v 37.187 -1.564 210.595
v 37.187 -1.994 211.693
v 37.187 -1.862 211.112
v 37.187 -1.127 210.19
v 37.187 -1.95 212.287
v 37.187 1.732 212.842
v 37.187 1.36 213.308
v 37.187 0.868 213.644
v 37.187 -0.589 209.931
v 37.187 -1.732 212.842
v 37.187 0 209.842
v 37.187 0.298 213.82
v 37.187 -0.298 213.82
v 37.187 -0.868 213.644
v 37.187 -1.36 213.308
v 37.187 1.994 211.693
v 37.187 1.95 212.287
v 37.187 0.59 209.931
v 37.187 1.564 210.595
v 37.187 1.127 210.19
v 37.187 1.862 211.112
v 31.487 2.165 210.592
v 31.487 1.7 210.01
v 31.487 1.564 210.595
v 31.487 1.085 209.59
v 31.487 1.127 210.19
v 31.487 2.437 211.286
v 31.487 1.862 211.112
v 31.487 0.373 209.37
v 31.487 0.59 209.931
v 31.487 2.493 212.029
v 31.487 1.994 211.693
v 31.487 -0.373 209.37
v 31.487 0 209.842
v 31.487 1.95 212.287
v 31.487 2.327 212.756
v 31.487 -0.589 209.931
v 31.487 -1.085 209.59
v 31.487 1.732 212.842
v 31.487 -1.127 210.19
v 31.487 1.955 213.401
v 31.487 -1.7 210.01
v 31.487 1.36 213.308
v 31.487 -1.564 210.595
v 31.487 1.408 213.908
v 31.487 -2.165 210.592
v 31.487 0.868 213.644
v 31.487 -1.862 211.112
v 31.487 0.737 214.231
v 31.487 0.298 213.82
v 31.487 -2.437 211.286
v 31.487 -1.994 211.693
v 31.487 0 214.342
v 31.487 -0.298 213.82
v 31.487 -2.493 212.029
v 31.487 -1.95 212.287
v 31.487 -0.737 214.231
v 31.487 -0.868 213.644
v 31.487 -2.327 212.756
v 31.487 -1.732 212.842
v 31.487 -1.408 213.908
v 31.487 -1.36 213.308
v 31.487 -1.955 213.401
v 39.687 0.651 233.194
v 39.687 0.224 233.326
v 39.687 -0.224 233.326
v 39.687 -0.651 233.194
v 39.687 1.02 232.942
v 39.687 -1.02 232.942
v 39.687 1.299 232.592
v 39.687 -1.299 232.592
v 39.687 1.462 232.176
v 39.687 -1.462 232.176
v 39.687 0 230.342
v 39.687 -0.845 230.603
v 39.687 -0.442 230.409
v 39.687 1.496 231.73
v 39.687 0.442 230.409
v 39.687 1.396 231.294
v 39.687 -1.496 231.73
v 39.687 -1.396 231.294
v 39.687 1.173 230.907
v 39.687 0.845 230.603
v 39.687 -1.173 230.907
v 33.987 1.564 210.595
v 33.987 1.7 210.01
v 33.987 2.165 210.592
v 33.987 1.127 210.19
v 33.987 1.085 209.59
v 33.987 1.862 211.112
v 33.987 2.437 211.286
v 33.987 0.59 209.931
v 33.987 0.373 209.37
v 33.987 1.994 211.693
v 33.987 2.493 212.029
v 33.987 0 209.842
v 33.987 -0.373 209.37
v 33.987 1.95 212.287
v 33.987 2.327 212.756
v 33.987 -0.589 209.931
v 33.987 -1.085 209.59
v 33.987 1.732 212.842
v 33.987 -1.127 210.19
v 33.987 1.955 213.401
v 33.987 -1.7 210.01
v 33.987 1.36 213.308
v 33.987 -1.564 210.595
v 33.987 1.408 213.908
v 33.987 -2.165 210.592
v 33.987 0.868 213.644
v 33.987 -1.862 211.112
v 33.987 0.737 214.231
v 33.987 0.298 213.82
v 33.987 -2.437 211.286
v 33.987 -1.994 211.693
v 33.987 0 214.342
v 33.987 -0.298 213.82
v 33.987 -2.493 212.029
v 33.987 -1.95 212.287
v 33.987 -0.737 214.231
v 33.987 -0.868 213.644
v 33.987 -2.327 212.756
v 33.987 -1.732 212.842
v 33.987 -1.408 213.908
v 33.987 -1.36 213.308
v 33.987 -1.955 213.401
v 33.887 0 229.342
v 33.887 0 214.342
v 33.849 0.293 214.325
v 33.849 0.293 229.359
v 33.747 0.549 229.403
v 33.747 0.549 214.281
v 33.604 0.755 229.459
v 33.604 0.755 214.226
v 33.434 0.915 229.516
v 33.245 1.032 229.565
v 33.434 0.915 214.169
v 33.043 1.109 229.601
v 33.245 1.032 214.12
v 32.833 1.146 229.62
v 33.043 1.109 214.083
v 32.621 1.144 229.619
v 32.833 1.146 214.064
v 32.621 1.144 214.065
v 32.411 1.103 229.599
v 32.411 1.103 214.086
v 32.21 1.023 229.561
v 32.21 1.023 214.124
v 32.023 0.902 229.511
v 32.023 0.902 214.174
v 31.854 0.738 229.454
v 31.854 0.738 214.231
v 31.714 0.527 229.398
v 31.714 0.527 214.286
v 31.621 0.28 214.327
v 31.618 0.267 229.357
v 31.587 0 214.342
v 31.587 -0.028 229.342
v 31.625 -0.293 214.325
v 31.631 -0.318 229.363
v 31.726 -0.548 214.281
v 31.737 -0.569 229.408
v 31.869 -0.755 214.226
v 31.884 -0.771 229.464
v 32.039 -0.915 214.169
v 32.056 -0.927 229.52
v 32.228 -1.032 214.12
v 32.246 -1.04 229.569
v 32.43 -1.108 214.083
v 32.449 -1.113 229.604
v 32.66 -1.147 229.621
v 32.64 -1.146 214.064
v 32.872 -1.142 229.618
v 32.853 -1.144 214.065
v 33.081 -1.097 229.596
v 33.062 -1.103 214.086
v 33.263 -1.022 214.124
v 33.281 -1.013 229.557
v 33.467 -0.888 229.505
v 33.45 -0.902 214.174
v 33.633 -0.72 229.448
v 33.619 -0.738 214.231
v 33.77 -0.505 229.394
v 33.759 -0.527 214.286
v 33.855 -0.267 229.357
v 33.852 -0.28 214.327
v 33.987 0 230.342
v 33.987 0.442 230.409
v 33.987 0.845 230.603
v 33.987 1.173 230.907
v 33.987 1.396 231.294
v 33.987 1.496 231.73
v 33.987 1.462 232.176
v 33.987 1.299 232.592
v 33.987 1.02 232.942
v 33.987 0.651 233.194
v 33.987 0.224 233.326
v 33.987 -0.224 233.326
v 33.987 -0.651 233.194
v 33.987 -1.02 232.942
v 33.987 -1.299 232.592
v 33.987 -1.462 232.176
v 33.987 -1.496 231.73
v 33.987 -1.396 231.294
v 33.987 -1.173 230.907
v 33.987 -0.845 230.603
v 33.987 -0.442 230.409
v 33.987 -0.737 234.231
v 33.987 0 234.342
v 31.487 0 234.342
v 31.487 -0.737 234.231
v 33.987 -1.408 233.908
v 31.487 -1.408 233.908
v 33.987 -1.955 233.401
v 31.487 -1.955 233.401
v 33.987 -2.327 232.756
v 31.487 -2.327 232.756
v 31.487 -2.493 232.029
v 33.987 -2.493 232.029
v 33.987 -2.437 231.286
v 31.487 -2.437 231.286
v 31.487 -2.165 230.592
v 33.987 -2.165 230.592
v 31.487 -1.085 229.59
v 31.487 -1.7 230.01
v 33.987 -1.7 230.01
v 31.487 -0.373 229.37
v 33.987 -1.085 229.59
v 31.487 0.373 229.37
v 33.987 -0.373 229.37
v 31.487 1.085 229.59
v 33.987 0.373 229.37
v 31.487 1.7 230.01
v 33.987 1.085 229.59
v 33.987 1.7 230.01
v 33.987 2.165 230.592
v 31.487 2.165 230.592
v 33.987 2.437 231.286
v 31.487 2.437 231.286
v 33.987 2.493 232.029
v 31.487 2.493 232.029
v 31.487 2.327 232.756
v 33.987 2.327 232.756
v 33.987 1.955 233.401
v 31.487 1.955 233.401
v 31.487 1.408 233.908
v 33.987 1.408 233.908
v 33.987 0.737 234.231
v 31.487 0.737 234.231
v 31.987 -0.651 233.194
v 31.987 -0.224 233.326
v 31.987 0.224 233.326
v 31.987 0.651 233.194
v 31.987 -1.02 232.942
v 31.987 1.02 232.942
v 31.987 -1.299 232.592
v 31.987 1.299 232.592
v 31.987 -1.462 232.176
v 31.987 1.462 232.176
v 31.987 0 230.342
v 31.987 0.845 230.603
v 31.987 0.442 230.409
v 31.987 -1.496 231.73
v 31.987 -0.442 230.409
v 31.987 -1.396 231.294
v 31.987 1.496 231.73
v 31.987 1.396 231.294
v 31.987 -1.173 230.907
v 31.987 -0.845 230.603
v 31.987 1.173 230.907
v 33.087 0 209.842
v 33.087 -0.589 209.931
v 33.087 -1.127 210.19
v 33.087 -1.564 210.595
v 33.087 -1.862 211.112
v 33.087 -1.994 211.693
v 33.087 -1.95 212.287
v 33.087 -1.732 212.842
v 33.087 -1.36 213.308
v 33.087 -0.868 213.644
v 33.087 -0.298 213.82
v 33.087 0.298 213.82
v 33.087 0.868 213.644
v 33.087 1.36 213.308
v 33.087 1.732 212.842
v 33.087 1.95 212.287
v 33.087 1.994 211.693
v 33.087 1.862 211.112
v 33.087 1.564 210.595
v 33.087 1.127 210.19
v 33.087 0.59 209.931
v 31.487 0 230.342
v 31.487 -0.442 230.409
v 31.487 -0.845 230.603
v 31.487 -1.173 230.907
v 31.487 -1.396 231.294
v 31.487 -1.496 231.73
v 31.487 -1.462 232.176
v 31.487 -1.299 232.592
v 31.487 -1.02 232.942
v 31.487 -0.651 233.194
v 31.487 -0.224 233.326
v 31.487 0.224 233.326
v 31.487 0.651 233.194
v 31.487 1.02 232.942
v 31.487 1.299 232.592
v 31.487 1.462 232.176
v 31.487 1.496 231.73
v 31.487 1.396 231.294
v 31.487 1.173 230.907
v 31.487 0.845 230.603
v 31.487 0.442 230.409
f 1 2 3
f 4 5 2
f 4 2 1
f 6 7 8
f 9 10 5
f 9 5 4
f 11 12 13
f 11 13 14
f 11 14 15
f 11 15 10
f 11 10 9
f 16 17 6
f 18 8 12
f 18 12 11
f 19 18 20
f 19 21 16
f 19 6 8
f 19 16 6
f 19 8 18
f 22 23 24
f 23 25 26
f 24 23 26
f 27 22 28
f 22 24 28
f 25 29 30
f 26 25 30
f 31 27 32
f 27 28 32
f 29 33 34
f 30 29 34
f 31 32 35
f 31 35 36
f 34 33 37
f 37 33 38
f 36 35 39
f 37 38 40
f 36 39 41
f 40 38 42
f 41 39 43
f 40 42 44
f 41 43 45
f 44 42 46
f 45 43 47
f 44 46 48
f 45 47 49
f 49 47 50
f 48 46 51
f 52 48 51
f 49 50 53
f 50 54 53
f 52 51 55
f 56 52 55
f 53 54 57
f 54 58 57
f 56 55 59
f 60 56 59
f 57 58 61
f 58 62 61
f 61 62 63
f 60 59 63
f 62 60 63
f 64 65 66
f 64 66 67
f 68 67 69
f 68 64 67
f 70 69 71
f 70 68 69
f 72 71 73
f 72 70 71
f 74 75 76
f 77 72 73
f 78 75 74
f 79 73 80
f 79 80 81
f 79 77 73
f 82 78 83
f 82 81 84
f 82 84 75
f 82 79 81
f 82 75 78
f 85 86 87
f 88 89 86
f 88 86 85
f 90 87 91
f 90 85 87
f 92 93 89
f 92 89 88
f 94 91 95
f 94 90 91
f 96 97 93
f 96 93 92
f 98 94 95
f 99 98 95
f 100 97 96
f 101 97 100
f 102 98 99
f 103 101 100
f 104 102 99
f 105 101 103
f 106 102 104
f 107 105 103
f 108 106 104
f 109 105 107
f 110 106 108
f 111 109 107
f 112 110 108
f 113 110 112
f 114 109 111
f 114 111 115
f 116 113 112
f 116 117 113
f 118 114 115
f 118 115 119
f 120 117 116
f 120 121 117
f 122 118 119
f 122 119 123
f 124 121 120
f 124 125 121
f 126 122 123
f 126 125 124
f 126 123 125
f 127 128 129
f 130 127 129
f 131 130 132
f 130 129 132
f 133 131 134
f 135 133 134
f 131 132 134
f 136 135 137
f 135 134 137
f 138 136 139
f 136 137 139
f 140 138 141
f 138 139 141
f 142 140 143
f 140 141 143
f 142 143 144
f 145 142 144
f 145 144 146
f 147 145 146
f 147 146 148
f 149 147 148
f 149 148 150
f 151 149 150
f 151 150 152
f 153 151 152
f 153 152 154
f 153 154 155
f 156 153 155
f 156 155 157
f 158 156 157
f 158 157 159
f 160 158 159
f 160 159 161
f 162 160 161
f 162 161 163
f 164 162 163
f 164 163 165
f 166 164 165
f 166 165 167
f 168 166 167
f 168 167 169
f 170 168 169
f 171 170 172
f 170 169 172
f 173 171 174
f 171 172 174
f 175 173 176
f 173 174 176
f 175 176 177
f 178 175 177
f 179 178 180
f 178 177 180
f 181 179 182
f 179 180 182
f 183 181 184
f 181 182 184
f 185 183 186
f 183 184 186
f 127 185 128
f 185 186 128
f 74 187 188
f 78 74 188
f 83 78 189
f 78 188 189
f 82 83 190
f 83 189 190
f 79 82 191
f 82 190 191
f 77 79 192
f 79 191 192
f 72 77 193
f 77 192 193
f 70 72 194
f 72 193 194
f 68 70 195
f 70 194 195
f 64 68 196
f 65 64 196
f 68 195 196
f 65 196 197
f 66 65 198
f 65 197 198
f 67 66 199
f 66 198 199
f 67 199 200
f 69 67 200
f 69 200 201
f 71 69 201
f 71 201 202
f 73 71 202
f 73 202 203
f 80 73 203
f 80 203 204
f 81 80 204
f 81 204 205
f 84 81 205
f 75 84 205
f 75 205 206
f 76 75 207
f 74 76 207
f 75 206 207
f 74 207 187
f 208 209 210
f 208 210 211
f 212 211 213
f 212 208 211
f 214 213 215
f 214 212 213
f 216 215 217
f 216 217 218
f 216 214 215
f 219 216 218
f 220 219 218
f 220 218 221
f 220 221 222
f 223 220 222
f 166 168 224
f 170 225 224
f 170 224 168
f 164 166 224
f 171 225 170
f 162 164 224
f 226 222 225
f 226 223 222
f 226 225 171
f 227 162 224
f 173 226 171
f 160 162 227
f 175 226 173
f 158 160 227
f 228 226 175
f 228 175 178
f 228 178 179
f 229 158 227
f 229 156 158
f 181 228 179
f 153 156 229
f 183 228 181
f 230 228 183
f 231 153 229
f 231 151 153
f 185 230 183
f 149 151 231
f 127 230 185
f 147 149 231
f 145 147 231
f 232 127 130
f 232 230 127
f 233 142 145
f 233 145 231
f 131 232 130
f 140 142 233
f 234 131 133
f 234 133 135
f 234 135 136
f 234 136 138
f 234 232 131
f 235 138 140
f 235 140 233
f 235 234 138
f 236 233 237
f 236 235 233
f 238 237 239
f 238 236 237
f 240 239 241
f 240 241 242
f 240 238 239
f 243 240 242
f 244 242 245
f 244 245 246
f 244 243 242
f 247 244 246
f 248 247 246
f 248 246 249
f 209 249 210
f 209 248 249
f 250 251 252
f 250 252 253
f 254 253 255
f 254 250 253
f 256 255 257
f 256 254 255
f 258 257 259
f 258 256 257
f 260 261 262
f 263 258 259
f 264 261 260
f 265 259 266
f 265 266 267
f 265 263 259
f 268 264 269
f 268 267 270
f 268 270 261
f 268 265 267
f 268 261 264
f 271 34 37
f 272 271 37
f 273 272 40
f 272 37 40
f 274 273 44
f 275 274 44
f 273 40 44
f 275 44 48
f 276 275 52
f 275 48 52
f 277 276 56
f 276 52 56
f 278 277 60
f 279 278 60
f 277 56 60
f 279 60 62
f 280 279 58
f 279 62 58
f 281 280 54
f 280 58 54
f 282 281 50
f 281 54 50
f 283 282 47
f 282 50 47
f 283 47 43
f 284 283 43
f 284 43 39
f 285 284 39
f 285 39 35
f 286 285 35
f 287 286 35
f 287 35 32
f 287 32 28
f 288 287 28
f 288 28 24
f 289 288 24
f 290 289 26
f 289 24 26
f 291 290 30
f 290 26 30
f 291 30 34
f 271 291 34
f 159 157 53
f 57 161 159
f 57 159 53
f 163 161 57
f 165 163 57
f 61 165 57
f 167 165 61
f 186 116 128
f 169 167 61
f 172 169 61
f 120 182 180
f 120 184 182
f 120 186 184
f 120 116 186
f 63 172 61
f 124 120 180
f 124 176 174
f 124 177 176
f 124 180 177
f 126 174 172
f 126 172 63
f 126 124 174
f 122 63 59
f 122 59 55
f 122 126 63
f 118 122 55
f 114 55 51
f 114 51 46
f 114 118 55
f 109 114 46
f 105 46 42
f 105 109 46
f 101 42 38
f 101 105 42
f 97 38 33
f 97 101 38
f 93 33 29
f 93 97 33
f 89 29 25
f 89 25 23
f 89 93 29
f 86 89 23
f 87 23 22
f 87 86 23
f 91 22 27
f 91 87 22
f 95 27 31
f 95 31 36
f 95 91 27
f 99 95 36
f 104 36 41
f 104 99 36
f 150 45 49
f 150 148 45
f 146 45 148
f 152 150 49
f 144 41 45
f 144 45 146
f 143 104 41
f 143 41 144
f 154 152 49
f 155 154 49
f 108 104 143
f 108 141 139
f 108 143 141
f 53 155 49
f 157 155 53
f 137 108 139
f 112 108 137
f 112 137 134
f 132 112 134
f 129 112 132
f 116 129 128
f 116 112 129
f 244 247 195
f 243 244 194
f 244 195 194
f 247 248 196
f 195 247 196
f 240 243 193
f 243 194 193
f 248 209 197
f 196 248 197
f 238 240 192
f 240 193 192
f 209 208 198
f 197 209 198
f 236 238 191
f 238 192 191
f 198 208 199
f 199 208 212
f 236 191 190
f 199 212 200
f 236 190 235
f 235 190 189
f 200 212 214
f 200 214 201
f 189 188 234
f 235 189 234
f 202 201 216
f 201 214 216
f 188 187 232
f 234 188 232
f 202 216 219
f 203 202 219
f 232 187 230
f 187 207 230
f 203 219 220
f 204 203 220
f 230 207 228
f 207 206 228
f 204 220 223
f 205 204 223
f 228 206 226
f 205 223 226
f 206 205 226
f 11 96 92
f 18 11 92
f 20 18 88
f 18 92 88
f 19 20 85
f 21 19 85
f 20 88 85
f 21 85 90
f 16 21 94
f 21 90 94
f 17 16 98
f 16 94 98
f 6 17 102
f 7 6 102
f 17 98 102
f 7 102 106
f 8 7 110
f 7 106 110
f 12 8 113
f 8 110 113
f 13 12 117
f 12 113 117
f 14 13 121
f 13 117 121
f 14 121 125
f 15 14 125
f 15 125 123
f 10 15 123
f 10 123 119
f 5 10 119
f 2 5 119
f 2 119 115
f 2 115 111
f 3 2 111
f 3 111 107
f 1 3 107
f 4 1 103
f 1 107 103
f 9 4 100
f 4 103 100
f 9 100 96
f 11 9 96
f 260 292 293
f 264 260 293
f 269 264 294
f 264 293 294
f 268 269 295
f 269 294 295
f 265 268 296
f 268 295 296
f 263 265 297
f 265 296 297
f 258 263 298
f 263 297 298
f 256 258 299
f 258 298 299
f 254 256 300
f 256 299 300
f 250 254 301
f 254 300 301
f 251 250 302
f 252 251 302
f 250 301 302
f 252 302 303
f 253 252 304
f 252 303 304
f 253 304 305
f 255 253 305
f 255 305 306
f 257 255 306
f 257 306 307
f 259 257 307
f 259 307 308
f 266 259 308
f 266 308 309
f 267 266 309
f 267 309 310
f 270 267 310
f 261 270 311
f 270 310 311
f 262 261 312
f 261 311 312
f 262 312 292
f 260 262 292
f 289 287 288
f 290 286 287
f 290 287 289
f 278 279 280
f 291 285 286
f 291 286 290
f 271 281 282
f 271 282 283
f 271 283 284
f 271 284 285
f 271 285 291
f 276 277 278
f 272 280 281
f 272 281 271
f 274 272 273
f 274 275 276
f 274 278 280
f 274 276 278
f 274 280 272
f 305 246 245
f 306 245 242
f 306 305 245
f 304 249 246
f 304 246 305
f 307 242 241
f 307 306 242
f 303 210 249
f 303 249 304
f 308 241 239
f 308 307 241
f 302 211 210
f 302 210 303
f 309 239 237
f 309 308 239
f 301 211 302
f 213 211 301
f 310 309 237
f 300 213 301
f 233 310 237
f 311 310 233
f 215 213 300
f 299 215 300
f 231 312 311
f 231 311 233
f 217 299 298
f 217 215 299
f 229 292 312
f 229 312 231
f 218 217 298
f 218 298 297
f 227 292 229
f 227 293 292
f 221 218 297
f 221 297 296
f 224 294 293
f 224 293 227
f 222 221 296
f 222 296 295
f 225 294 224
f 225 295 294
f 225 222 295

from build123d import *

# Parameters (mm, degrees)
SKETCH1_R           = 29.21
BOSS_EXTRUDE1_DEPTH = 406.4
SKETCH2_W           = 63.5
SKETCH2_H           = 63.5
SKETCH3_R           = 50.8
BOSS_EXTRUDE2_DEPTH = 81.28
SKETCH10_W          = 63.5
SKETCH10_H          = 63.5
SKETCH5_R           = 50.8
CUT_EXTRUDE1_DEPTH  = 40.64
SKETCH11_R          = 38.1
BOSS_EXTRUDE4_DEPTH = 144.78
SKETCH16_R          = 38.1
CUT_EXTRUDE2_DEPTH  = 12.7
SCALE1_SCALE        = 0.03937


with BuildPart() as part:
    # Sketch1 → Boss-Extrude1 (new body)
    with BuildSketch(Plane.XY):
        Circle(SKETCH1_R)
    extrude(amount=BOSS_EXTRUDE1_DEPTH)

    # Sketch2 → Revolve1 (revolve)
    with BuildSketch(Plane(origin=(0, 0, 0), x_dir=(1, 0, 0), z_dir=(0, 1, 0))):
        with Locations((0, 19.05)):
            Rectangle(SKETCH2_W, SKETCH2_H)
    revolve(axis=Axis((-31.75, 0, -50.8), (1, 0, 0)))

    # Sketch3 → Boss-Extrude2 (add)
    with BuildSketch(Plane(origin=(31.75, 0, 0), x_dir=(0, 0, -1), z_dir=(1, 0, 0))):
        with Locations((50.8, 0)):
            Circle(SKETCH3_R)
    extrude(amount=BOSS_EXTRUDE2_DEPTH)

    # Sketch10 → Revolve2 (revolve)
    with BuildSketch(Plane(origin=(0, 0, 0), x_dir=(1, 0, 0), z_dir=(0, 1, 0)), mode=Mode.PRIVATE) as revolve2_sk:
        with Locations((0, -425.45)):
            Rectangle(SKETCH10_W, SKETCH10_H)
    revolve(revolve2_sk.sketch.rotate(Axis((-31.75, 0, 457.2), (1, 0, 0)), 180), axis=Axis((-31.75, 0, 457.2), (1, 0, 0)))

    # Sketch5 → Cut-Extrude1 (cut)
    with BuildSketch(Plane.ZY.offset(31.75)):
        with Locations(Location((-50.8, 0, 0), (0, 0, 180))):
            Circle(SKETCH5_R)
    extrude(amount=-CUT_EXTRUDE1_DEPTH, mode=Mode.SUBTRACT)

    # Sketch11 → Boss-Extrude4 (add)
    with BuildSketch(Plane(origin=(31.75, 0, 0), x_dir=(0, 0, -1), z_dir=(1, 0, 0))):
        with Locations((-457.2, 0)):
            Circle(SKETCH11_R)
    extrude(amount=BOSS_EXTRUDE4_DEPTH)

    # Sketch16 → Cut-Extrude2 (cut)
    with BuildSketch(Plane.ZY.offset(31.75)):
        with Locations(Location((457.2, 0, 0), (0, 0, 180))):
            Circle(SKETCH16_R)
    extrude(amount=-CUT_EXTRUDE2_DEPTH, mode=Mode.SUBTRACT)


with BuildPart() as part_1:
    # Scale1: scaled about (34.078233281, 5.4627e-05, 222.606303222)
    add(part.part.scale(SCALE1_SCALE).moved(Location((32.736573237, 5.2476e-05, 213.842293064))))


solid = part_1.part
